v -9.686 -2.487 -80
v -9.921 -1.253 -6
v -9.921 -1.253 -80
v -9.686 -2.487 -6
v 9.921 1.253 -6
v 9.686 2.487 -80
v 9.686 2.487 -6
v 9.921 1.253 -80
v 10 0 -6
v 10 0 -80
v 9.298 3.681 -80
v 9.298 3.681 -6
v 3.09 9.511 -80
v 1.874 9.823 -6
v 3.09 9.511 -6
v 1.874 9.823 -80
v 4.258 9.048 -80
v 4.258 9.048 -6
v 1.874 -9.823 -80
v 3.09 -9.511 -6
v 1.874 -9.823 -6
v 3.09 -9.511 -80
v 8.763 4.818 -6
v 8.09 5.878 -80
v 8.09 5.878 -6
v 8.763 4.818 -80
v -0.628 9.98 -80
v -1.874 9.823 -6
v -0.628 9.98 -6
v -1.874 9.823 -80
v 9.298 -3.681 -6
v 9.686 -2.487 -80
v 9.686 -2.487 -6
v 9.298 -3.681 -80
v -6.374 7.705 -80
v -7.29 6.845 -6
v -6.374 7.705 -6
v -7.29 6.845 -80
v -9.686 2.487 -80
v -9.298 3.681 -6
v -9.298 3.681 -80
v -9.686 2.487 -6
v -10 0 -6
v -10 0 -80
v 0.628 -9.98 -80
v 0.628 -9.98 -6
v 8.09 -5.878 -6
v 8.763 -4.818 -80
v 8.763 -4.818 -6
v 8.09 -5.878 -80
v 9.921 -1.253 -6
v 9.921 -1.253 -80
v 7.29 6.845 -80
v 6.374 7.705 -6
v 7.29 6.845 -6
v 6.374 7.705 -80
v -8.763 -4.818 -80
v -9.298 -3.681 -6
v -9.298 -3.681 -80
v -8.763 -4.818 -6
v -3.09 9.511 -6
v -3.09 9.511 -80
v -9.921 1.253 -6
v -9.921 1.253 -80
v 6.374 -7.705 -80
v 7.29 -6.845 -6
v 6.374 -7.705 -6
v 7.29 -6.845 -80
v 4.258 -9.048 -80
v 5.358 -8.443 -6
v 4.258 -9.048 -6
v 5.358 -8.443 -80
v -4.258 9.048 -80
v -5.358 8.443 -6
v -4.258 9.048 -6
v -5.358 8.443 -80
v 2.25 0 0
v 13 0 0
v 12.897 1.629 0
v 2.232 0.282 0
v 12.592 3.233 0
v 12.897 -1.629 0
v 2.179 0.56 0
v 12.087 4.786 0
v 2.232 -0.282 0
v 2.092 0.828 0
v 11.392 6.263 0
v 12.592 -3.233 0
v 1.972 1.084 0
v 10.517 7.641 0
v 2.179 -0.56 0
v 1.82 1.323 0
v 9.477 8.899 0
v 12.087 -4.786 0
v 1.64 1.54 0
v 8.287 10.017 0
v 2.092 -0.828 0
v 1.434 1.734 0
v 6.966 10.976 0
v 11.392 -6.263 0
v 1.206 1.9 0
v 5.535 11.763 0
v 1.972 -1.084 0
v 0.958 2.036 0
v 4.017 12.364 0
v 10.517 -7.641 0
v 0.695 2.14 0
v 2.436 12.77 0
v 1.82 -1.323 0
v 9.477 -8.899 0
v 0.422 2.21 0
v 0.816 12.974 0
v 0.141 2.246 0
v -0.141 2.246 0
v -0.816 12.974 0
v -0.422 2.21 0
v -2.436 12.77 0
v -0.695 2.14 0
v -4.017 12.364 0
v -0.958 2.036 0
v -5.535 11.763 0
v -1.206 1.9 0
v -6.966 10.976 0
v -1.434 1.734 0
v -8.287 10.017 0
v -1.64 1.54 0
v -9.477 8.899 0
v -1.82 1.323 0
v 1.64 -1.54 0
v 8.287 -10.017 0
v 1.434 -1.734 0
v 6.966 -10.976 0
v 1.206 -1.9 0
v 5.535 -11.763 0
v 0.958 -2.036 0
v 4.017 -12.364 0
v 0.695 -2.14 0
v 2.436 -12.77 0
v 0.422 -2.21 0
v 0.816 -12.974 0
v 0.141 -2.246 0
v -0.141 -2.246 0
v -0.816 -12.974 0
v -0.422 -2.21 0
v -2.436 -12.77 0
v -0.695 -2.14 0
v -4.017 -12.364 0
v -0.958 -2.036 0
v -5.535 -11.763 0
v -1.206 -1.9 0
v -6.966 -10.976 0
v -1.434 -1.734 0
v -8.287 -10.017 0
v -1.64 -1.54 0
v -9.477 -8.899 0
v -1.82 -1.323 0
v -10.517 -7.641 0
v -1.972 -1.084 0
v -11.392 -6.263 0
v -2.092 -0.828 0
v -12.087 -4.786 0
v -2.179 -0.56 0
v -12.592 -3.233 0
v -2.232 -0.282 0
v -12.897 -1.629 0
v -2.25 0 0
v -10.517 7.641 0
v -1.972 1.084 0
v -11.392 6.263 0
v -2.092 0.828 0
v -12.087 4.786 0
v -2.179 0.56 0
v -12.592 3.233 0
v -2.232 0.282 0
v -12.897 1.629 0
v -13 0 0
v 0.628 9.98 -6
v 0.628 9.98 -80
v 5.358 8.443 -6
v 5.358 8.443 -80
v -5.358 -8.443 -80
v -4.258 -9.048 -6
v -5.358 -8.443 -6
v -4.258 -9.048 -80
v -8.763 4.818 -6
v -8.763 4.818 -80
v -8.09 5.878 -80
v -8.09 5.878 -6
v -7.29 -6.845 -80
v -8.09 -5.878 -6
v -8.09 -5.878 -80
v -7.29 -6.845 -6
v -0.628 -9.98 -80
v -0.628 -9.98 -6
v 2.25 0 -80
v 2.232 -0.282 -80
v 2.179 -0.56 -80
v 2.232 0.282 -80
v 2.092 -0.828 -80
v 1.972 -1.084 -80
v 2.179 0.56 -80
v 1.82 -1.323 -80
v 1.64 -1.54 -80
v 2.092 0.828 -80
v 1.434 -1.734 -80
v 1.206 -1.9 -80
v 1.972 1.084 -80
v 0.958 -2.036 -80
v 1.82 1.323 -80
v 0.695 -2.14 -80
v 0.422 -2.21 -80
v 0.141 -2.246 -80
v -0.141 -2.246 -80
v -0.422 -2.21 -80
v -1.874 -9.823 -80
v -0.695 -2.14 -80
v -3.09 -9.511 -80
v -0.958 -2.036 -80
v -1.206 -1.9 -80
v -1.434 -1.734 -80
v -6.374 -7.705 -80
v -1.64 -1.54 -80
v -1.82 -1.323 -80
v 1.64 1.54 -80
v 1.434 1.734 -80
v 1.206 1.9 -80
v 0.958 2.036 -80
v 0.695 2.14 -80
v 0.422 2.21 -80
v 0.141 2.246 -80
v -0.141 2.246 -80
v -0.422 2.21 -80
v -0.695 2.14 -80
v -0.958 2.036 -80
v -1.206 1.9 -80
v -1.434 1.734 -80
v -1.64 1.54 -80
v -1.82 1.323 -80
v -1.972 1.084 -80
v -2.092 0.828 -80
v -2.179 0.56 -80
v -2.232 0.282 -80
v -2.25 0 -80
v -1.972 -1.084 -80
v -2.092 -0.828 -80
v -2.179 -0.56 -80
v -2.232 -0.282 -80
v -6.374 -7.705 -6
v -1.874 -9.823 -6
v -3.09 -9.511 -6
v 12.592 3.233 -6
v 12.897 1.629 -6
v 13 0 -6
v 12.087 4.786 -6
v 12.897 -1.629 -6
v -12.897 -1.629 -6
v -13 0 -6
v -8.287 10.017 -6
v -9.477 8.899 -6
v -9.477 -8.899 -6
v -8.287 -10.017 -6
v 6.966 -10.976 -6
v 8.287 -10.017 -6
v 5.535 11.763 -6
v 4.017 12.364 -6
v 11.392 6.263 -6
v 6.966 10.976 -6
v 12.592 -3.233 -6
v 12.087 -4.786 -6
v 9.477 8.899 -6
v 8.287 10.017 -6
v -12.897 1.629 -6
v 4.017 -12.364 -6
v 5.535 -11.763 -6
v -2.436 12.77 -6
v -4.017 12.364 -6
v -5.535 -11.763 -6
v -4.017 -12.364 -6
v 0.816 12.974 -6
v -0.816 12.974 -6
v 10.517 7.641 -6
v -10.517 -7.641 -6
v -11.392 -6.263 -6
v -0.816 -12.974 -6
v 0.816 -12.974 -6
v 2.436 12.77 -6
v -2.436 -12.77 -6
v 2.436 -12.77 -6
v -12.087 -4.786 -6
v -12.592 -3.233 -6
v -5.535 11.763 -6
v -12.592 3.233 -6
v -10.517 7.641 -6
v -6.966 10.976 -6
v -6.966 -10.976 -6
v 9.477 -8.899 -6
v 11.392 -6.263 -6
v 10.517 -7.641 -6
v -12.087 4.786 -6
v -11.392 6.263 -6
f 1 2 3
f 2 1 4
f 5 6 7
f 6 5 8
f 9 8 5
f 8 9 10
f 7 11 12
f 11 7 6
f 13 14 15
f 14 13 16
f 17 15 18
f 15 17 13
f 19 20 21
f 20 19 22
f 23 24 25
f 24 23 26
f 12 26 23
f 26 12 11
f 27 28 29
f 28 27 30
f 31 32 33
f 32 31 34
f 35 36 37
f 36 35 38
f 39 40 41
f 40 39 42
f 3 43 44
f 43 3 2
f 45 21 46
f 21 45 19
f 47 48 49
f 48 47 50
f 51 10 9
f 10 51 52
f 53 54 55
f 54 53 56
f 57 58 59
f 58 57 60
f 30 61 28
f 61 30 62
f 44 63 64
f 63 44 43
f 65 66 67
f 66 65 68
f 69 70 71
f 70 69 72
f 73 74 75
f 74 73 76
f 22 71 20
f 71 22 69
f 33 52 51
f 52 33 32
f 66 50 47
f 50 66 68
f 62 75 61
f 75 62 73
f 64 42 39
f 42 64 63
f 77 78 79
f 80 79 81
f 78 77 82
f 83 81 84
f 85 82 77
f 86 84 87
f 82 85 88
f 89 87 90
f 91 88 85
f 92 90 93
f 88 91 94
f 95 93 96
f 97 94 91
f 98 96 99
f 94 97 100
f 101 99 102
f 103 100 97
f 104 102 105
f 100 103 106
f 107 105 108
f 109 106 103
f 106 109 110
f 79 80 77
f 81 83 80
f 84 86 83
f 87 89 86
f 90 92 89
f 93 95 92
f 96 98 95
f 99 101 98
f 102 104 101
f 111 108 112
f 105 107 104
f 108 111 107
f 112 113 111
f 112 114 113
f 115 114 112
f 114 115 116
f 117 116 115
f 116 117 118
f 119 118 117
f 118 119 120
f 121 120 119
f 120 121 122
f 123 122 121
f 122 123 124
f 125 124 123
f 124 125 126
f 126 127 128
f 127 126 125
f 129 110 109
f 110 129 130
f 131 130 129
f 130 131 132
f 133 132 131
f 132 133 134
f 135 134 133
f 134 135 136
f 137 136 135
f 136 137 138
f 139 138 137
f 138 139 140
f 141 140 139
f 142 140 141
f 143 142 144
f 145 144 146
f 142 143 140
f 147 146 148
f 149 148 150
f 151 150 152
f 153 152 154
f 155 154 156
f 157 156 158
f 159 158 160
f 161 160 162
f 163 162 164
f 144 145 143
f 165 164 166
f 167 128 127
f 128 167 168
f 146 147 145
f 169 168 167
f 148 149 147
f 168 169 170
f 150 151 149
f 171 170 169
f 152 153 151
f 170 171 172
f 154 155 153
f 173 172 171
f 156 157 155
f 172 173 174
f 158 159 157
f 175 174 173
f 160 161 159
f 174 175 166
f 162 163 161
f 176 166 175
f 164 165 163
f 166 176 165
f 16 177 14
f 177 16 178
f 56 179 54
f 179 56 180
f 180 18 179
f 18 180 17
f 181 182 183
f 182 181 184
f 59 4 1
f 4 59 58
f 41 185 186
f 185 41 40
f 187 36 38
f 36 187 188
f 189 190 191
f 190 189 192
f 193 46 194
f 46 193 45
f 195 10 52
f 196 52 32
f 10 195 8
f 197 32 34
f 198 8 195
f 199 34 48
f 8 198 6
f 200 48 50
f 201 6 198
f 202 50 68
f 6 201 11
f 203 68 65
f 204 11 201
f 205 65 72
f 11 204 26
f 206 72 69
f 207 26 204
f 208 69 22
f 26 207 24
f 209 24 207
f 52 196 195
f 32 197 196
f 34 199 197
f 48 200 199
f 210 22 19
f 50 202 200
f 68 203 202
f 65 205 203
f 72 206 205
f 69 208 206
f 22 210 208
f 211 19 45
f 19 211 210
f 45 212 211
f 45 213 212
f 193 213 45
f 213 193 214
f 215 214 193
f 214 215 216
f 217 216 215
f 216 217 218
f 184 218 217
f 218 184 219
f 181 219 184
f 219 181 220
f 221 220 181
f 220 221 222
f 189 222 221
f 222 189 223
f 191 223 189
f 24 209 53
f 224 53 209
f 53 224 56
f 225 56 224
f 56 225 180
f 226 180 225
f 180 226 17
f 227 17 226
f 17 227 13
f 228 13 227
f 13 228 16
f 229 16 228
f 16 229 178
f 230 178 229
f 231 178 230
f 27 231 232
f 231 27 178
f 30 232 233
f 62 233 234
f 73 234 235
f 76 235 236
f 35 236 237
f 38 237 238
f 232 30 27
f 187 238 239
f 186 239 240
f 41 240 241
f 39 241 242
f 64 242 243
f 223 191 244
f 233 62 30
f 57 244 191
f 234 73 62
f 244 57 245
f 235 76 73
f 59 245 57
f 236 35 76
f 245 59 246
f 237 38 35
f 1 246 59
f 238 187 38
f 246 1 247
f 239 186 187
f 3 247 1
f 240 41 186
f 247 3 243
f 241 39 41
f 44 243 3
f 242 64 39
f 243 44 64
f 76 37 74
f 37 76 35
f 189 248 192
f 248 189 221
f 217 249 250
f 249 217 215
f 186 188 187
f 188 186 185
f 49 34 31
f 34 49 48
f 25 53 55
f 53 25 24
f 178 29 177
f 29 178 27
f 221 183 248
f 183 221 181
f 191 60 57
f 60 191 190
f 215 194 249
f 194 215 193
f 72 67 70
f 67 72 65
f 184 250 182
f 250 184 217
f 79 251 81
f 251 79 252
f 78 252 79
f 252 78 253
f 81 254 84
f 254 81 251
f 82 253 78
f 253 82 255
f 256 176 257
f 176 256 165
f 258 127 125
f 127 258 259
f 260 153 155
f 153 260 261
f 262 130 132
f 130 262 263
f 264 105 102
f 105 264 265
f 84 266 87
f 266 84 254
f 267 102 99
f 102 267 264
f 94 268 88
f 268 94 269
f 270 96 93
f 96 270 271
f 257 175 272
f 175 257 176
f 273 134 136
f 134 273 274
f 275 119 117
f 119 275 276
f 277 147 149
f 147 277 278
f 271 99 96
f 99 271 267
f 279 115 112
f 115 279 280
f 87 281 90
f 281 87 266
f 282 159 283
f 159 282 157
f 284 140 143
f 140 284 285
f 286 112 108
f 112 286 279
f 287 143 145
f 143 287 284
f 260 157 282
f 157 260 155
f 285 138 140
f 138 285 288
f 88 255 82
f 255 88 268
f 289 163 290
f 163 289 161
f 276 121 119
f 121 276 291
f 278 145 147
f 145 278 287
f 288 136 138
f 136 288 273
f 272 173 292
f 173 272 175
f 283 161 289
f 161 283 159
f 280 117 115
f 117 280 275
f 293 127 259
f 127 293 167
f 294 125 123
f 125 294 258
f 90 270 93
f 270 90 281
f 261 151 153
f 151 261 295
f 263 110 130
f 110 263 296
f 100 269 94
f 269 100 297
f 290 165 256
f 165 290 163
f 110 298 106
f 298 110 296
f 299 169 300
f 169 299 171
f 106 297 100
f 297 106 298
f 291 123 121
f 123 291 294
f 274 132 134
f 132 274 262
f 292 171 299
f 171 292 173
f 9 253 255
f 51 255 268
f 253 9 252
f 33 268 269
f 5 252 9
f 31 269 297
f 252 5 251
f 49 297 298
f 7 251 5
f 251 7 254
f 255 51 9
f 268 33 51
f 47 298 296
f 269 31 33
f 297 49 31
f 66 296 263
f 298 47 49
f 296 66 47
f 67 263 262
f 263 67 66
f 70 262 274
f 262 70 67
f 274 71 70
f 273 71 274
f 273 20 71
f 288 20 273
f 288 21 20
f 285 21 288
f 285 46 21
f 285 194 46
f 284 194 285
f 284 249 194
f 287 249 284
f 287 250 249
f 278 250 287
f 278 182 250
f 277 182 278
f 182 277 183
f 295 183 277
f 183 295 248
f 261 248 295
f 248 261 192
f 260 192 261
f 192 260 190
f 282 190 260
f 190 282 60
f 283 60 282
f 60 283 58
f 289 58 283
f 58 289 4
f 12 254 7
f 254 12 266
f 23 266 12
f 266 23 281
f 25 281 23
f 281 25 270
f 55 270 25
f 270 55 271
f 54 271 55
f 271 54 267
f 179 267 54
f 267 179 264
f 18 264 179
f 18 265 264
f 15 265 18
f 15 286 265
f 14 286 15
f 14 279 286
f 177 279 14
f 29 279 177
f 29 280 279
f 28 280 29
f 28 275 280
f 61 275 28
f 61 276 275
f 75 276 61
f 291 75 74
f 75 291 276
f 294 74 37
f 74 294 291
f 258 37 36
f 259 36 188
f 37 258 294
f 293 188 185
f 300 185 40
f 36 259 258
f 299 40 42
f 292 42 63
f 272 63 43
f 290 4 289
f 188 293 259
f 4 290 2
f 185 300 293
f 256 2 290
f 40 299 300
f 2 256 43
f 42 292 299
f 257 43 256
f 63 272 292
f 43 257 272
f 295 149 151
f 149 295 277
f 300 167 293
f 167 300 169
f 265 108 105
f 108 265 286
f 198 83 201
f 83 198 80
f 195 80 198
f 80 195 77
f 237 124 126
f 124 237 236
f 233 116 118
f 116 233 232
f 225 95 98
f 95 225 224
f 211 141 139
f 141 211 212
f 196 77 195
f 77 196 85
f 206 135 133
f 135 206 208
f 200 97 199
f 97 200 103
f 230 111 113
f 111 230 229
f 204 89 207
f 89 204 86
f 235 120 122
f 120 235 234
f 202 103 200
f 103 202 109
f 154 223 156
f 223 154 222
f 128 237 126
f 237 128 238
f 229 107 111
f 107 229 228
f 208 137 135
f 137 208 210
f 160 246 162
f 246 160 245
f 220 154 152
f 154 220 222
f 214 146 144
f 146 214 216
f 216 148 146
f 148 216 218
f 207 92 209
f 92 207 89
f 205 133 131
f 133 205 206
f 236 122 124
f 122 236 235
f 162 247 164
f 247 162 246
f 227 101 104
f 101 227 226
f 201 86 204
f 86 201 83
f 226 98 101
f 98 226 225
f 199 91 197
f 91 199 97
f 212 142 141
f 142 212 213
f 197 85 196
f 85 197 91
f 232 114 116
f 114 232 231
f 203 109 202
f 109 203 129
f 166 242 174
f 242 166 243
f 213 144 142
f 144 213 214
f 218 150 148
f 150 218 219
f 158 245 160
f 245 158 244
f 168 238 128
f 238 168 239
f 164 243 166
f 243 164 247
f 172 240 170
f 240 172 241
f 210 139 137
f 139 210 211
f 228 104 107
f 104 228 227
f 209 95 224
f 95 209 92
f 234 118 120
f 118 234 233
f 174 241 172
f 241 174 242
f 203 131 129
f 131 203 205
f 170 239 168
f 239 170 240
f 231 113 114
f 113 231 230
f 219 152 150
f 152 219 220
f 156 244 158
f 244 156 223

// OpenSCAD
$fn = 50;


difference() {
	union() {
		translate(v = [0, 0, -80.0000000000]) {
			cylinder(h = 80, r = 10.0000000000);
		}
		translate(v = [0, 0, -6.0000000000]) {
			cylinder(h = 6, r = 13.0000000000);
		}
	}
	union() {
		#translate(v = [0, 0, -80]) {
			cylinder(h = 80, r = 2.2500000000);
		}
	}
}
